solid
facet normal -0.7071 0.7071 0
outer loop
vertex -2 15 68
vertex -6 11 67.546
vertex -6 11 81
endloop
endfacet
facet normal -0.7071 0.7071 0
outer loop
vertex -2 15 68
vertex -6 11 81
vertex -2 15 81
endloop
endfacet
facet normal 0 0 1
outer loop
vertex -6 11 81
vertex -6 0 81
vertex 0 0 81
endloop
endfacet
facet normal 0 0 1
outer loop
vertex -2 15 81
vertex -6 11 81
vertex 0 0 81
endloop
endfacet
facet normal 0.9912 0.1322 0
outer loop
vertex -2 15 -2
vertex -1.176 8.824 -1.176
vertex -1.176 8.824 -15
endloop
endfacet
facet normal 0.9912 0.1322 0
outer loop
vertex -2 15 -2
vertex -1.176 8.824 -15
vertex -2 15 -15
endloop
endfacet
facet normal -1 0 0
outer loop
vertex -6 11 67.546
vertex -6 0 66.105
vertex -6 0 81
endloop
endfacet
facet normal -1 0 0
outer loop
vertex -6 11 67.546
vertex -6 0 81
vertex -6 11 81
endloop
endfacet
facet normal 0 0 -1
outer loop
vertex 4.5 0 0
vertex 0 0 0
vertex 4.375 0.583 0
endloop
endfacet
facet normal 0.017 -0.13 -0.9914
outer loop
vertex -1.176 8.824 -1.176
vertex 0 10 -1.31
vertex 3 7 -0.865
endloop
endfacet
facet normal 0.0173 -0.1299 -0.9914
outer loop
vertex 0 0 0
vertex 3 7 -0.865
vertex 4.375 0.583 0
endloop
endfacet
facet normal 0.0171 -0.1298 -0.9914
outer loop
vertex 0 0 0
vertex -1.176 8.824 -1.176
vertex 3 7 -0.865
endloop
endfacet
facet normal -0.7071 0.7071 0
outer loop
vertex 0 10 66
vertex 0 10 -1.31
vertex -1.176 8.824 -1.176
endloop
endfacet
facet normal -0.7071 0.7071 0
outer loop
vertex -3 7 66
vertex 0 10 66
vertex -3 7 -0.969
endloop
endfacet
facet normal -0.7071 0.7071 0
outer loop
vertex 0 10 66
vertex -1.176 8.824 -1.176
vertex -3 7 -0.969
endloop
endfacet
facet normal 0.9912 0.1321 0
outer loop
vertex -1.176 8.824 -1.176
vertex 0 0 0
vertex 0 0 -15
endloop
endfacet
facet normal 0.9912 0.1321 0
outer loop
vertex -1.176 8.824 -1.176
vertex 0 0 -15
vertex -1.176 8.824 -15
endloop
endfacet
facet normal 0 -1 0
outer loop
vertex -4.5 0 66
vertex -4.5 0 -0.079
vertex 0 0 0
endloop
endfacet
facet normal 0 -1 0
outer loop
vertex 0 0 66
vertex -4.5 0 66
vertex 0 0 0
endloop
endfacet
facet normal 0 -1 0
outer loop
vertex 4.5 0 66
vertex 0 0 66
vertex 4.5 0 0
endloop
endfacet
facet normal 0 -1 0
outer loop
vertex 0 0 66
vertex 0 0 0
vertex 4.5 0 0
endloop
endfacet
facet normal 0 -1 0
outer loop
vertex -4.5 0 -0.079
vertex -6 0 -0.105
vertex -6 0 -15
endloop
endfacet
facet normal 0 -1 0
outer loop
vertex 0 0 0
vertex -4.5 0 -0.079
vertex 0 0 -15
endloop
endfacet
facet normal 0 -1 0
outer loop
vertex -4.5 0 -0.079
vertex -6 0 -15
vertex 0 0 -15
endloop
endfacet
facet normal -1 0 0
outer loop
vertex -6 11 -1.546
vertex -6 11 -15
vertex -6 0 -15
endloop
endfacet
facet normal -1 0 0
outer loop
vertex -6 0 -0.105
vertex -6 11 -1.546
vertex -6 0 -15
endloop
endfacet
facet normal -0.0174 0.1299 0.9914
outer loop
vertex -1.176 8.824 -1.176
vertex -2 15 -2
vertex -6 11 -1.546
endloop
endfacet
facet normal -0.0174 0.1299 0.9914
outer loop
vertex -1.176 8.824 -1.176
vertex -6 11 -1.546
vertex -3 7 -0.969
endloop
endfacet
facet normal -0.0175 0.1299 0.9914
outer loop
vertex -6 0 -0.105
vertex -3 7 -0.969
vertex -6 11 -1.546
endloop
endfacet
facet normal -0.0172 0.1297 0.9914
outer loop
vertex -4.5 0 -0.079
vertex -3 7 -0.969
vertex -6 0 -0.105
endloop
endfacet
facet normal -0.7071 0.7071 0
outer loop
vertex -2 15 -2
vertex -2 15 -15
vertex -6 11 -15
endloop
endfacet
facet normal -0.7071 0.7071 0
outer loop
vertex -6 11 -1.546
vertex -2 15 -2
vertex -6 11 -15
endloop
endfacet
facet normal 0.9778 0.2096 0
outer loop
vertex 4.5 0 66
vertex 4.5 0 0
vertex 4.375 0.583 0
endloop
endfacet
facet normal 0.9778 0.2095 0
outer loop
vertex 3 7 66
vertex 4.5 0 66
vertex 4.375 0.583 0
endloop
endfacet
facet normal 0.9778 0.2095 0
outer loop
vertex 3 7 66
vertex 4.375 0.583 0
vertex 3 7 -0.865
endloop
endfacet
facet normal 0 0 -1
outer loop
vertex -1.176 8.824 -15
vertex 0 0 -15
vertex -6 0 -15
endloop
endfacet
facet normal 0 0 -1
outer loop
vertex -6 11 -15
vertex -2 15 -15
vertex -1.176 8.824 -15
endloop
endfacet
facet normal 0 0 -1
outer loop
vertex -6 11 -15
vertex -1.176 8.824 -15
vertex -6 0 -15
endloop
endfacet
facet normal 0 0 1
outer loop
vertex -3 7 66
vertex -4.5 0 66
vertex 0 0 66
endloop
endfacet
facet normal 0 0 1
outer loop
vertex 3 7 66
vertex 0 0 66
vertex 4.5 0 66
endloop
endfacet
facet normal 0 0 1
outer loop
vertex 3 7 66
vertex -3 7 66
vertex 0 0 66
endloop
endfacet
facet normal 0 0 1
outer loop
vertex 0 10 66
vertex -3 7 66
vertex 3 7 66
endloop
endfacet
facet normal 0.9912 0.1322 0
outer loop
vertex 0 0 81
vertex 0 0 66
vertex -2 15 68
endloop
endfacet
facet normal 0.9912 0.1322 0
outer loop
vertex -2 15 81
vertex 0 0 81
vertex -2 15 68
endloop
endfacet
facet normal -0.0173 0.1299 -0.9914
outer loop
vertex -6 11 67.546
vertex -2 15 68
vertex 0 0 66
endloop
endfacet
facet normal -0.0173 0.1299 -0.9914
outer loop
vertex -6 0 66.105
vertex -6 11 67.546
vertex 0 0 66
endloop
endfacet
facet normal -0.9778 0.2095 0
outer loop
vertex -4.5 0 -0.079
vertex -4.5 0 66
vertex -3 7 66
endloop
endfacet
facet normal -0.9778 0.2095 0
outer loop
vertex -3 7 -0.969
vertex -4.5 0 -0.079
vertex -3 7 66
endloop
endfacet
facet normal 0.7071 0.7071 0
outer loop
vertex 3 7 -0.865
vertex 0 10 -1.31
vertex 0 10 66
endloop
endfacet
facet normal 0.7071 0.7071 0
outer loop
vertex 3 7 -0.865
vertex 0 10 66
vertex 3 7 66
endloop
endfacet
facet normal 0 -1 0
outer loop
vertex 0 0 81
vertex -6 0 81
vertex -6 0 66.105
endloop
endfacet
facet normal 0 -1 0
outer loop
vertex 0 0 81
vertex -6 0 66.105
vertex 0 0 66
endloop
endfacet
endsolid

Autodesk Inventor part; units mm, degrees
ref_plane "YZ Plane" through (0, 0, 0) normal (1, 0, 0) x (0, 1, 0)
ref_plane "XZ Plane" through (0, 0, 0) normal (0, 1, 0) x (-1, 0, 0)
ref_plane "XY Plane" through (0, 0, 0) normal (0, 0, 1) x (1, 0, 0)
sketch "Sketch1" plane through (0, 0, 0) normal (0, 0, 1) x (1, 0, 0)
  line L0 (0, 10) -> (3, 7)
  line L1 (0, 10) -> (4.2426, 10) construction
  line L2 (0, 10) -> (-4.2426, 10) construction
  line L3 (4.5, 0) -> (3, 7)
  line L4 (0, 0) -> (4.5, 0)
  line L5 (0, 10) -> (-3, 7)
  line L6 (0, 10) -> (-4.2426, 10) construction
  line L7 (-4.5, 0) -> (-3, 7)
  line L8 (0, 0) -> (-4.5, 0)
  dimension "d2" = 45
extrude "Extrusion1" add sketch "Sketch1" along normal blind 66
sketch "Sketch2" plane through (0, 0, 66) normal (0, 0, 1) x (1, 0, 0)
  line L0 (0, 0) -> (-6, 0)
  line L1 (-4.5, 0) -> (4.5, 0) projected
  line L2 (-6, 0) -> (-6, 11)
  line L3 (-6, 11) -> (-2, 15)
  line L4 (0, 0) -> (-2, 15)
  dimension "d8" = 6
  dimension "d9" = 11
extrude "Extrusion2" add sketch "Sketch2" along normal blind 15
sketch "Sketch8" plane through (0, 0, 0) normal (0, 0, -1) x (-1, 0, 0)
  line L0 (1.1765, 8.8235) -> (3, 7) projected
  line L1 (3, 7) -> (4.5, 0) projected
  line L2 (6, 0) -> (4.5, 0) projected
  line L3 (6, 11) -> (6, 0) projected
  line L4 (2, 15) -> (6, 11) projected
  line L5 (1.1765, 8.8235) -> (2, 15) projected
  line L6 (0, 0) -> (2, 15) projected
  line L7 (2, 15) -> (6, 11) projected
  line L8 (6, 11) -> (6, 0) projected
  line L9 (6, 0) -> (0, 0) projected
extrude "Extrusion8" add sketch "Sketch8" along normal blind 15
sketch "Sketch13" plane through (0, 0, 81) normal (0.9912279, 0.1321637, 0) x (0, 0, -1)
  line L0 (15, 15.1327) -> (15, 11.6965) projected
  line L1 (15, 15.1327) -> (15, 0)
  line L2 (15, 15.1327) -> (13, 15.1327)
  line L3 (15, 15.1327) -> (0, 15.1327) projected
  line L4 (13, 15.1327) -> (15, 0)
  line L5 (15, 7.3351) -> (15, 0.5947) projected
  line L6 (15, 0.5947) -> (15, 0)
  line L7 (81, 15.1327) -> (96, 15.1327) projected
  line L8 (81, 15.1327) -> (81, 8.9016) projected
  line L9 (81, 0) -> (81, 8.9016) projected
  line L10 (81, 0) -> (96, 0) projected
  line L11 (15, 0) -> (0, 0) projected
  line L12 (15, 8.9016) -> (15, 0) projected
  line L13 (15, 8.9016) -> (15, 15.1327) projected
  line L14 (15, 15.1327) -> (0, 15.1327) projected
  line L15 (81, 15.1327) -> (81, 8.9016) projected
  line L16 (81, 15.1327) -> (83, 15.1327)
  line L17 (81, 15.1327) -> (94, 15.1327) projected
  line L18 (81, 0) -> (96, 0) projected
  line L19 (83, 15.1327) -> (81, 0)
  line L20 (0, 0) -> (0, 15.1327) projected
  line L21 (96, 15.1327) -> (96, 0) projected
  point P0 (2, 15.1327)
  dimension "d42" = 2
  dimension "d43" = 2
extrude "Extrusion11" cut sketch "Sketch13" against normal blind 12.225 contours L0 L1 L4 L2 | L7 L19 L9 L8
sketch "Sketch15" plane through (0, 0, 66) normal (0, 0, 1) x (1, 0, 0)
  line L0 (0, 0) -> (4.5, 0) projected
  line L1 (4.5, 0) -> (3, 7) projected
  line L2 (3, 7) -> (0, 10) projected
  line L3 (0, 10) -> (-3, 7) projected
  line L4 (-3, 7) -> (-4.5, 0) projected
  line L5 (0, 0) -> (-4.5, 0) projected
extrude "Extrusion12" add sketch "Sketch15" against normal up to surface surface through (-2, 15, -2) normal (0.0173167, -0.129875, -0.9913791)
properties part number "inside-join-2"
